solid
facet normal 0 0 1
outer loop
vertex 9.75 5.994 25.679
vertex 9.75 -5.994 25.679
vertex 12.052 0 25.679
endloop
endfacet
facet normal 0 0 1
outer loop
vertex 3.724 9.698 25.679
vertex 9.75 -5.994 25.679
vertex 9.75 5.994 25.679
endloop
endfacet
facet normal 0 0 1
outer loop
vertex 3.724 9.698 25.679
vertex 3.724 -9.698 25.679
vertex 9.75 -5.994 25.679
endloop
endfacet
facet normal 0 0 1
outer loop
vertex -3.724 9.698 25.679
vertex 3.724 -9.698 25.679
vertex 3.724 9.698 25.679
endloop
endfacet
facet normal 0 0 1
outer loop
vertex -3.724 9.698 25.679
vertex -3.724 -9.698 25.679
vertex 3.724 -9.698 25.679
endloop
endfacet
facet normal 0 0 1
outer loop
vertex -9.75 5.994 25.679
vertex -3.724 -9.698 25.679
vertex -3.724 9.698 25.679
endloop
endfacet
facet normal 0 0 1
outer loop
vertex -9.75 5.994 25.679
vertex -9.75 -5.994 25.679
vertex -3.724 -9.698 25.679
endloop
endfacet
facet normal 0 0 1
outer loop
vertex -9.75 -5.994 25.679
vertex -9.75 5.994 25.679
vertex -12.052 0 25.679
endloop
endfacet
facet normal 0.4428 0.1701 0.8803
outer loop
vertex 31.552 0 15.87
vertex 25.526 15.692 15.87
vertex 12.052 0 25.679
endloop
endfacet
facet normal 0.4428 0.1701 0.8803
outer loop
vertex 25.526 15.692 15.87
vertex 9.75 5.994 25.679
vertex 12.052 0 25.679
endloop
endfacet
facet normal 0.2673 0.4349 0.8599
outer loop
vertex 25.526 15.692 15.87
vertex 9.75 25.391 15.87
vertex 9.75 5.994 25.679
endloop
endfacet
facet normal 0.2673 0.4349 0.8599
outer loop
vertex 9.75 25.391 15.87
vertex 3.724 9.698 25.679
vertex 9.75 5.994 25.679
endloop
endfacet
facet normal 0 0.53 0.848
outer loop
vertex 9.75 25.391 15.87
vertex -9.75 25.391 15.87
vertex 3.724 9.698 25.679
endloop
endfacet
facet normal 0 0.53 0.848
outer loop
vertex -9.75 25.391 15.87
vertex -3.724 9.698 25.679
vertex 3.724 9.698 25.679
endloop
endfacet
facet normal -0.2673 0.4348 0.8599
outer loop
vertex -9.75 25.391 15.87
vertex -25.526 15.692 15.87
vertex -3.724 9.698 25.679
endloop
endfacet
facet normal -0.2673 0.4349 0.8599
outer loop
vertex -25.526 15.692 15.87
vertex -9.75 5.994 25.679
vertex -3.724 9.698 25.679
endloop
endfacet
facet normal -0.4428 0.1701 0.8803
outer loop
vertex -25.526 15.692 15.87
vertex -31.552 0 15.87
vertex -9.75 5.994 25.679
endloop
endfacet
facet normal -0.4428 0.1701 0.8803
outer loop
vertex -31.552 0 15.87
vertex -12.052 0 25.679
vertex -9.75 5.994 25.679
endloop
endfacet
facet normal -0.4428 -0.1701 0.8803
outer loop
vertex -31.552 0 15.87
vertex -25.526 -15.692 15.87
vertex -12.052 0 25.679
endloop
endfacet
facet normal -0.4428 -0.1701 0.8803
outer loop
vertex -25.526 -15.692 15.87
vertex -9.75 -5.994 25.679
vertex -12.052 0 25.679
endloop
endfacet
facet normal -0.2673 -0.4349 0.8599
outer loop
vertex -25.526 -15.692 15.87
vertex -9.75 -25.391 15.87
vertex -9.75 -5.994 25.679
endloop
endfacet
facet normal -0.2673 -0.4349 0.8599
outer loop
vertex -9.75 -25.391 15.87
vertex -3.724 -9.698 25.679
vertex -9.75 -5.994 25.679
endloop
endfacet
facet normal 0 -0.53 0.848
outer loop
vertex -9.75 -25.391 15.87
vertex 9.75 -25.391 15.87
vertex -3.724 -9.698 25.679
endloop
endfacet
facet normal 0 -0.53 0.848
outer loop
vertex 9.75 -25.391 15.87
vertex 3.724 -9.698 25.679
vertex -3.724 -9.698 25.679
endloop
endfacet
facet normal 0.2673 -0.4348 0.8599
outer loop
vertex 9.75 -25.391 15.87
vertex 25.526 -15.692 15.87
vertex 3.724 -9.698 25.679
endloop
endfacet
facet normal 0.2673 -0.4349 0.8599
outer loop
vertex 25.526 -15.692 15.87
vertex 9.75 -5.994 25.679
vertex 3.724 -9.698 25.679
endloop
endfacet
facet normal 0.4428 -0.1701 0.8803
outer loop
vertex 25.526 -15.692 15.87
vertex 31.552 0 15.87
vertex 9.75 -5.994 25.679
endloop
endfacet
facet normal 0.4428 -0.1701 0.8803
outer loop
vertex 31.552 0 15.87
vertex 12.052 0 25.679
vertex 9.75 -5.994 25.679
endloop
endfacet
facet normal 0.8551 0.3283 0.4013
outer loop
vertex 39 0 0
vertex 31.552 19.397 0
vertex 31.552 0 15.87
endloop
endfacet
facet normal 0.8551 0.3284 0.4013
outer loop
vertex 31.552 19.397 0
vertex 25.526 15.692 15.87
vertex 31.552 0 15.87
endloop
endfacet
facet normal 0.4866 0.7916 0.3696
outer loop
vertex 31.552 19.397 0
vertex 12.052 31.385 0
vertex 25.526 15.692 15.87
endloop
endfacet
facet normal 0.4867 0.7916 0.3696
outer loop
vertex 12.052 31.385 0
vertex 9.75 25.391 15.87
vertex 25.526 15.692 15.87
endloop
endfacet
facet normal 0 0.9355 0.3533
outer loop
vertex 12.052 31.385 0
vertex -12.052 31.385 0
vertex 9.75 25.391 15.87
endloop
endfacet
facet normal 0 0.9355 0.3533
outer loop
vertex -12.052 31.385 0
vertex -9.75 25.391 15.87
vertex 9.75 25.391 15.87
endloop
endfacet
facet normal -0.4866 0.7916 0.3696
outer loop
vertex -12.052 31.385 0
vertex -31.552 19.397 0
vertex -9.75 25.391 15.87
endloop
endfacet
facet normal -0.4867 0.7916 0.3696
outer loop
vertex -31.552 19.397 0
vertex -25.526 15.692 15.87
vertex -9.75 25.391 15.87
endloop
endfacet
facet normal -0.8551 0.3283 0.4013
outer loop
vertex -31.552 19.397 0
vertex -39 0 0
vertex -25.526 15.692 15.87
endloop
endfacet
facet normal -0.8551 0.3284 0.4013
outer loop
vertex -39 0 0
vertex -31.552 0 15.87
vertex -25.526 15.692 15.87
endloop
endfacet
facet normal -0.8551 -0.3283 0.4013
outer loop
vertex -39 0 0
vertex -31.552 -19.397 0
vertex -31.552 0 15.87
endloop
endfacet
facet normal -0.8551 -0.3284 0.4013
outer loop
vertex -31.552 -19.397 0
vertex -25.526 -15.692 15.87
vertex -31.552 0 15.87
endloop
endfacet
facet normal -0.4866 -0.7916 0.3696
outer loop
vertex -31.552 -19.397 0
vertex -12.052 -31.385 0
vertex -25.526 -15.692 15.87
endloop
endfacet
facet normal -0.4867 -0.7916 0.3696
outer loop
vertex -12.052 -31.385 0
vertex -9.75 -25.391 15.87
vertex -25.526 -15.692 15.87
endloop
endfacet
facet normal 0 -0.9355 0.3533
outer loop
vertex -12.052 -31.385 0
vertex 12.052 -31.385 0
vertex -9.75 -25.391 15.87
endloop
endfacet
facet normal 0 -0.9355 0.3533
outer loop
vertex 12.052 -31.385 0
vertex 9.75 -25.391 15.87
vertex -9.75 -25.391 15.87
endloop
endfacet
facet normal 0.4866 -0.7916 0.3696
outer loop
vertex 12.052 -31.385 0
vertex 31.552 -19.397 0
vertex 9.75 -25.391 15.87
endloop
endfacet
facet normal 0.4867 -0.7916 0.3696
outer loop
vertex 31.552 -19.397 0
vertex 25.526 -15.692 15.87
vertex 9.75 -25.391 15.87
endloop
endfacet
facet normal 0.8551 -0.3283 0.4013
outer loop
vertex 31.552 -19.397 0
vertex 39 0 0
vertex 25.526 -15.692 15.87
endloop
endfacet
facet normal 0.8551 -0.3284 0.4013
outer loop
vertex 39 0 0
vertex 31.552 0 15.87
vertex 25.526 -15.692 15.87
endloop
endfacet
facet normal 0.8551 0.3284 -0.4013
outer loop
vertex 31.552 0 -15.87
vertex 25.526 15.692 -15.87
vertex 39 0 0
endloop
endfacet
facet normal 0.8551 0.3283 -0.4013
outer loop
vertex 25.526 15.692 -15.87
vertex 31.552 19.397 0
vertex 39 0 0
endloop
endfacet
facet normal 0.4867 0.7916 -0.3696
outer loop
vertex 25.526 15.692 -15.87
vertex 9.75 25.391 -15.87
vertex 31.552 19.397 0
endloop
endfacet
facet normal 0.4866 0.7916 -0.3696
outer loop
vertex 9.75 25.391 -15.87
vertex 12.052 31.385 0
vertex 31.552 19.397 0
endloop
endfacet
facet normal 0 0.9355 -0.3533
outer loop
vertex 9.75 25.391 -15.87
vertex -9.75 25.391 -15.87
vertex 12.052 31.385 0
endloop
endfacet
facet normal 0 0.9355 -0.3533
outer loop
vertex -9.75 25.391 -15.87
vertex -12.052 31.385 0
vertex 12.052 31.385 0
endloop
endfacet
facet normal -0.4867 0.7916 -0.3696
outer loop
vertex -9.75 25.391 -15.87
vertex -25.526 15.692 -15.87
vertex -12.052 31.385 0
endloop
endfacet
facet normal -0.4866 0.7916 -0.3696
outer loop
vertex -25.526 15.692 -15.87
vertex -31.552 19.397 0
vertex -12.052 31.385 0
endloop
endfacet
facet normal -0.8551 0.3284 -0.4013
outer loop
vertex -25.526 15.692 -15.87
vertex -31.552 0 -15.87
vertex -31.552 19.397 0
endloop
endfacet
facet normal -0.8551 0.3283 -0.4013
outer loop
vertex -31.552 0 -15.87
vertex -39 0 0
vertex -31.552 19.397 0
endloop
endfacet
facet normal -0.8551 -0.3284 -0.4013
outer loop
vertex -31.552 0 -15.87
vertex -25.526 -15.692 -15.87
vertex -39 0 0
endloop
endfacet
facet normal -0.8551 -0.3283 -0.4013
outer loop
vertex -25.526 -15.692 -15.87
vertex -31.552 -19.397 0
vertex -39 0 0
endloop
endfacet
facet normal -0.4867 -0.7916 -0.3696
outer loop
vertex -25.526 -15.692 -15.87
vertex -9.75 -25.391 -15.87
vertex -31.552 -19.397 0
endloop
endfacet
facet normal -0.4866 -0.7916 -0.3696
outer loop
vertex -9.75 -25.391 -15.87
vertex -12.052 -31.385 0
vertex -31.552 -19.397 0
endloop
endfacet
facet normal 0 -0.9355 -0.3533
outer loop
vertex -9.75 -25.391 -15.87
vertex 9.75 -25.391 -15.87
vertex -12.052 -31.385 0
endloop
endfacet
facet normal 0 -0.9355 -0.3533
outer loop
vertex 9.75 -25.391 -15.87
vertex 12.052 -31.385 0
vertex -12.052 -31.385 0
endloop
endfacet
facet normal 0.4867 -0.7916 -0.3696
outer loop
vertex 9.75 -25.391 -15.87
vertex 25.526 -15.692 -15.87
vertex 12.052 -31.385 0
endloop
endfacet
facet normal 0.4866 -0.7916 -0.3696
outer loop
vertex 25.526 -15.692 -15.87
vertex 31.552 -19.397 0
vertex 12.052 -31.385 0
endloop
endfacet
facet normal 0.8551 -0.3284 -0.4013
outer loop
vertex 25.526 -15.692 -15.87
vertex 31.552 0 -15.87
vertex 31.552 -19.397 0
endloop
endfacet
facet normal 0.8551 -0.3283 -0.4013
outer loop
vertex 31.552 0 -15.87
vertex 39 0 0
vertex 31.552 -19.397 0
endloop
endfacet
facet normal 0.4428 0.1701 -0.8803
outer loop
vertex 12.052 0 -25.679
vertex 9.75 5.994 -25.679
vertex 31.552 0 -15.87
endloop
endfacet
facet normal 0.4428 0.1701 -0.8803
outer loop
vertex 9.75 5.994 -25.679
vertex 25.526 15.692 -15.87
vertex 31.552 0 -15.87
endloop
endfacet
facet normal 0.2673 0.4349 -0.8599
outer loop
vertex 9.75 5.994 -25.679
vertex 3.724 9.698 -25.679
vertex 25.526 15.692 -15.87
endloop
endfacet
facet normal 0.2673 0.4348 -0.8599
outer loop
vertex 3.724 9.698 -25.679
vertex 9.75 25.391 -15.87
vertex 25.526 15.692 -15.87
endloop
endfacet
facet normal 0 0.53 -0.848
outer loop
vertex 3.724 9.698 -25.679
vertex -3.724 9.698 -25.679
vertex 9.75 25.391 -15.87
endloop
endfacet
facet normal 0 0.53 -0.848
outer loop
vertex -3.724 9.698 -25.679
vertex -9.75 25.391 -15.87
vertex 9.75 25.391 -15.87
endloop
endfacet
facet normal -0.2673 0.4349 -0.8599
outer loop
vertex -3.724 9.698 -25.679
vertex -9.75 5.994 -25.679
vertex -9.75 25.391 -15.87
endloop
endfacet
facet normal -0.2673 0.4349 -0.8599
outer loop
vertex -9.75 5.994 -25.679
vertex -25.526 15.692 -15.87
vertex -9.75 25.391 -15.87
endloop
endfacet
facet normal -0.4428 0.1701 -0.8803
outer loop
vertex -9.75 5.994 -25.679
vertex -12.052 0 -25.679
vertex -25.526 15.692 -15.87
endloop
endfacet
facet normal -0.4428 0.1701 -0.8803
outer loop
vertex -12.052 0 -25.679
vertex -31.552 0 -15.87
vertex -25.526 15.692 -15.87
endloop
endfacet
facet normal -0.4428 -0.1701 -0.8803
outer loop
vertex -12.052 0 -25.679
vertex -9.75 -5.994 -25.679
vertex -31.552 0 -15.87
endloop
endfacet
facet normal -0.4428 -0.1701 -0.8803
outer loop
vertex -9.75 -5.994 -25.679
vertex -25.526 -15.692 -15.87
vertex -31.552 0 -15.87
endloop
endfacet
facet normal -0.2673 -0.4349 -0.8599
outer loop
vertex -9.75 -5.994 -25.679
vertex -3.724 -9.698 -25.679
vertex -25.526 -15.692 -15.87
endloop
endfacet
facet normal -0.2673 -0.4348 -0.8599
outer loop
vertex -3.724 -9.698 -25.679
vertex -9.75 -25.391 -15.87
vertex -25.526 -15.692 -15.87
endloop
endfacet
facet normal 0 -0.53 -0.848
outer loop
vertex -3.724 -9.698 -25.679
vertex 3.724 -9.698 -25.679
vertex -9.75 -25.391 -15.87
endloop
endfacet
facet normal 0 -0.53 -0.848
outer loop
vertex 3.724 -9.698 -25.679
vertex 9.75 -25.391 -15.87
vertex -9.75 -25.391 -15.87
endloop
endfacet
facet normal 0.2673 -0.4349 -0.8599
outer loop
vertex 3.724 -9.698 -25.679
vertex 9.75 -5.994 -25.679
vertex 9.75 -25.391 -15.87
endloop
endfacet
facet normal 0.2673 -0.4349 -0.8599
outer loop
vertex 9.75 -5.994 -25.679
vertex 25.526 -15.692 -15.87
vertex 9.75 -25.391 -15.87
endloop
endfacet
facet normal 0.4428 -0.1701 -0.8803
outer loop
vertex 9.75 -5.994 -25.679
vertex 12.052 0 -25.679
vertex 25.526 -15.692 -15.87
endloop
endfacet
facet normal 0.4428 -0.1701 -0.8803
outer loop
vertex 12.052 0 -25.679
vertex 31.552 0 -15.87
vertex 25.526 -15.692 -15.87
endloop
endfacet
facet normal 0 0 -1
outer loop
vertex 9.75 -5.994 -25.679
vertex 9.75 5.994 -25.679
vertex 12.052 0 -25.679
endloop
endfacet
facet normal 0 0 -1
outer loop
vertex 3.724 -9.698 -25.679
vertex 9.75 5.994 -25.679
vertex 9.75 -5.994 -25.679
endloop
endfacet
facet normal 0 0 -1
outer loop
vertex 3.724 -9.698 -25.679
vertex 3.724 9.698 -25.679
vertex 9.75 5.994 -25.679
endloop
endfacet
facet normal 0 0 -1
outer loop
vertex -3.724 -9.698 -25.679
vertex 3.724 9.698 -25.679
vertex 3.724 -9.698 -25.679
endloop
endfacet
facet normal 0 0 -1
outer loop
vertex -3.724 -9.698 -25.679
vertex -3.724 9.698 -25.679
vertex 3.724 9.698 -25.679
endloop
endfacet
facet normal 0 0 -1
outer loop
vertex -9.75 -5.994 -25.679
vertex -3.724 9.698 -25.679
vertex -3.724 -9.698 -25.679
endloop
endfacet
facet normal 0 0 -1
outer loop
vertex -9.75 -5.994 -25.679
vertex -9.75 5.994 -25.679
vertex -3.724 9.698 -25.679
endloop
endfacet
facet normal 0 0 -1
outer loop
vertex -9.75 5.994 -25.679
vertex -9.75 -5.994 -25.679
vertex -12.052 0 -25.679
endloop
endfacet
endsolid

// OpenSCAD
// Generated by SolidPython 1.0.1 on 2020-07-29 00:46:50


scale(v = [13, 11, 9]) {
	sphere(r = 3);
}
/***********************************************
*********      SolidPython code:      **********
************************************************
 
# import packages: SolidPython
from solid import *
from solid.utils import *
from itertools import chain, combinations, permutations


class Resize:

    def __init__(self, scad_file):
        self.scad_file = scad_file
        #self.scad_file = import_scad(scad_file)
        # cone/cylinder param:
        self.r1 = 0
        self.r2 = 0
        self.h = 0
        # rectangular prism param:
        self.w = 0
        self.l = 0
        # ellipse param:
        self.r = 0

    # import OpenScad code (file name corresponds to shape)


    # classify shape + parameters
    def assign(self, param1, param2, param3):
        if self.scad_file == 'cone.scad':
            self.r1 = param1
            self.r2 = param2
            self.h = param3
        elif self.scad_file == 'cylinder.scad':
            self.r1 = param1
            self.r2 = param2
            self.h = param3
        elif self.scad_file == 'rectangularPrism.scad':
            self.h = param1
            self.l = param2
            self.w = param3
        else:
            self.r = param1
            self.h = param2

    # resize parameters
    def iterate(self):
        x = range(3, 20, 2)
        i = 1
        if self.scad_file == 'cone.scad':
            tempList = list(permutations(x, 2))
            for temp in tempList:
                param1 = temp[0]
                param2 = temp[1]
                filepath = 'produced_scad_files/' + 'cone' + str(param1) + '_' + str(param2) + '_' + '.scad'
                scad_render_to_file(cylinder(h=param1, r1=param2, r2=0), filepath)

        elif self.scad_file == 'cylinder.scad':
            tempList = list(permutations(x, 3))
            for temp in tempList:
                param1 = temp[0]
                param2 = temp[1]
                filepath = 'produced_scad_files/' + 'cylinder' + str(param1) + '_' + str(param2) + '_' + '.scad'
                scad_render_to_file(cylinder(h=param1, r1=param2, r2=param2), filepath)

        elif self.scad_file == 'rectangularPrism.scad':
            tempList = list(permutations(x, 3))
            for temp in tempList:
                param1 = temp[0]
                param2 = temp[1]
                param3 = temp[2]
                filepath = 'produced_scad_files/' + 'rectangularPrism' + str(param1) + '_' + str(param2) + '_' + str(
                    param3) + '.scad'
                scad_render_to_file(cube(size=(param1, param2, param3)), filepath)

        elif self.scad_file == 'ellipse.scad':
            tempList = list(permutations(x, 4))
            for temp in tempList:
                param1 = temp[0]
                param2 = temp[1]
                param3 = temp[2]
                param4 = temp[3]
                filepath = 'produced_scad_files/' + 'ellipse' + str(param1) + '_' + str(param2) + '_' + str(param3) + '_' + str(param4) + '.scad'
                scad_render_to_file(scale([param1, param2, param3])(sphere(r=param4)), filepath)

    def render_to_scadfile(self):
        scad_render_to_file(scad, 'example.scad') 
 
************************************************/
